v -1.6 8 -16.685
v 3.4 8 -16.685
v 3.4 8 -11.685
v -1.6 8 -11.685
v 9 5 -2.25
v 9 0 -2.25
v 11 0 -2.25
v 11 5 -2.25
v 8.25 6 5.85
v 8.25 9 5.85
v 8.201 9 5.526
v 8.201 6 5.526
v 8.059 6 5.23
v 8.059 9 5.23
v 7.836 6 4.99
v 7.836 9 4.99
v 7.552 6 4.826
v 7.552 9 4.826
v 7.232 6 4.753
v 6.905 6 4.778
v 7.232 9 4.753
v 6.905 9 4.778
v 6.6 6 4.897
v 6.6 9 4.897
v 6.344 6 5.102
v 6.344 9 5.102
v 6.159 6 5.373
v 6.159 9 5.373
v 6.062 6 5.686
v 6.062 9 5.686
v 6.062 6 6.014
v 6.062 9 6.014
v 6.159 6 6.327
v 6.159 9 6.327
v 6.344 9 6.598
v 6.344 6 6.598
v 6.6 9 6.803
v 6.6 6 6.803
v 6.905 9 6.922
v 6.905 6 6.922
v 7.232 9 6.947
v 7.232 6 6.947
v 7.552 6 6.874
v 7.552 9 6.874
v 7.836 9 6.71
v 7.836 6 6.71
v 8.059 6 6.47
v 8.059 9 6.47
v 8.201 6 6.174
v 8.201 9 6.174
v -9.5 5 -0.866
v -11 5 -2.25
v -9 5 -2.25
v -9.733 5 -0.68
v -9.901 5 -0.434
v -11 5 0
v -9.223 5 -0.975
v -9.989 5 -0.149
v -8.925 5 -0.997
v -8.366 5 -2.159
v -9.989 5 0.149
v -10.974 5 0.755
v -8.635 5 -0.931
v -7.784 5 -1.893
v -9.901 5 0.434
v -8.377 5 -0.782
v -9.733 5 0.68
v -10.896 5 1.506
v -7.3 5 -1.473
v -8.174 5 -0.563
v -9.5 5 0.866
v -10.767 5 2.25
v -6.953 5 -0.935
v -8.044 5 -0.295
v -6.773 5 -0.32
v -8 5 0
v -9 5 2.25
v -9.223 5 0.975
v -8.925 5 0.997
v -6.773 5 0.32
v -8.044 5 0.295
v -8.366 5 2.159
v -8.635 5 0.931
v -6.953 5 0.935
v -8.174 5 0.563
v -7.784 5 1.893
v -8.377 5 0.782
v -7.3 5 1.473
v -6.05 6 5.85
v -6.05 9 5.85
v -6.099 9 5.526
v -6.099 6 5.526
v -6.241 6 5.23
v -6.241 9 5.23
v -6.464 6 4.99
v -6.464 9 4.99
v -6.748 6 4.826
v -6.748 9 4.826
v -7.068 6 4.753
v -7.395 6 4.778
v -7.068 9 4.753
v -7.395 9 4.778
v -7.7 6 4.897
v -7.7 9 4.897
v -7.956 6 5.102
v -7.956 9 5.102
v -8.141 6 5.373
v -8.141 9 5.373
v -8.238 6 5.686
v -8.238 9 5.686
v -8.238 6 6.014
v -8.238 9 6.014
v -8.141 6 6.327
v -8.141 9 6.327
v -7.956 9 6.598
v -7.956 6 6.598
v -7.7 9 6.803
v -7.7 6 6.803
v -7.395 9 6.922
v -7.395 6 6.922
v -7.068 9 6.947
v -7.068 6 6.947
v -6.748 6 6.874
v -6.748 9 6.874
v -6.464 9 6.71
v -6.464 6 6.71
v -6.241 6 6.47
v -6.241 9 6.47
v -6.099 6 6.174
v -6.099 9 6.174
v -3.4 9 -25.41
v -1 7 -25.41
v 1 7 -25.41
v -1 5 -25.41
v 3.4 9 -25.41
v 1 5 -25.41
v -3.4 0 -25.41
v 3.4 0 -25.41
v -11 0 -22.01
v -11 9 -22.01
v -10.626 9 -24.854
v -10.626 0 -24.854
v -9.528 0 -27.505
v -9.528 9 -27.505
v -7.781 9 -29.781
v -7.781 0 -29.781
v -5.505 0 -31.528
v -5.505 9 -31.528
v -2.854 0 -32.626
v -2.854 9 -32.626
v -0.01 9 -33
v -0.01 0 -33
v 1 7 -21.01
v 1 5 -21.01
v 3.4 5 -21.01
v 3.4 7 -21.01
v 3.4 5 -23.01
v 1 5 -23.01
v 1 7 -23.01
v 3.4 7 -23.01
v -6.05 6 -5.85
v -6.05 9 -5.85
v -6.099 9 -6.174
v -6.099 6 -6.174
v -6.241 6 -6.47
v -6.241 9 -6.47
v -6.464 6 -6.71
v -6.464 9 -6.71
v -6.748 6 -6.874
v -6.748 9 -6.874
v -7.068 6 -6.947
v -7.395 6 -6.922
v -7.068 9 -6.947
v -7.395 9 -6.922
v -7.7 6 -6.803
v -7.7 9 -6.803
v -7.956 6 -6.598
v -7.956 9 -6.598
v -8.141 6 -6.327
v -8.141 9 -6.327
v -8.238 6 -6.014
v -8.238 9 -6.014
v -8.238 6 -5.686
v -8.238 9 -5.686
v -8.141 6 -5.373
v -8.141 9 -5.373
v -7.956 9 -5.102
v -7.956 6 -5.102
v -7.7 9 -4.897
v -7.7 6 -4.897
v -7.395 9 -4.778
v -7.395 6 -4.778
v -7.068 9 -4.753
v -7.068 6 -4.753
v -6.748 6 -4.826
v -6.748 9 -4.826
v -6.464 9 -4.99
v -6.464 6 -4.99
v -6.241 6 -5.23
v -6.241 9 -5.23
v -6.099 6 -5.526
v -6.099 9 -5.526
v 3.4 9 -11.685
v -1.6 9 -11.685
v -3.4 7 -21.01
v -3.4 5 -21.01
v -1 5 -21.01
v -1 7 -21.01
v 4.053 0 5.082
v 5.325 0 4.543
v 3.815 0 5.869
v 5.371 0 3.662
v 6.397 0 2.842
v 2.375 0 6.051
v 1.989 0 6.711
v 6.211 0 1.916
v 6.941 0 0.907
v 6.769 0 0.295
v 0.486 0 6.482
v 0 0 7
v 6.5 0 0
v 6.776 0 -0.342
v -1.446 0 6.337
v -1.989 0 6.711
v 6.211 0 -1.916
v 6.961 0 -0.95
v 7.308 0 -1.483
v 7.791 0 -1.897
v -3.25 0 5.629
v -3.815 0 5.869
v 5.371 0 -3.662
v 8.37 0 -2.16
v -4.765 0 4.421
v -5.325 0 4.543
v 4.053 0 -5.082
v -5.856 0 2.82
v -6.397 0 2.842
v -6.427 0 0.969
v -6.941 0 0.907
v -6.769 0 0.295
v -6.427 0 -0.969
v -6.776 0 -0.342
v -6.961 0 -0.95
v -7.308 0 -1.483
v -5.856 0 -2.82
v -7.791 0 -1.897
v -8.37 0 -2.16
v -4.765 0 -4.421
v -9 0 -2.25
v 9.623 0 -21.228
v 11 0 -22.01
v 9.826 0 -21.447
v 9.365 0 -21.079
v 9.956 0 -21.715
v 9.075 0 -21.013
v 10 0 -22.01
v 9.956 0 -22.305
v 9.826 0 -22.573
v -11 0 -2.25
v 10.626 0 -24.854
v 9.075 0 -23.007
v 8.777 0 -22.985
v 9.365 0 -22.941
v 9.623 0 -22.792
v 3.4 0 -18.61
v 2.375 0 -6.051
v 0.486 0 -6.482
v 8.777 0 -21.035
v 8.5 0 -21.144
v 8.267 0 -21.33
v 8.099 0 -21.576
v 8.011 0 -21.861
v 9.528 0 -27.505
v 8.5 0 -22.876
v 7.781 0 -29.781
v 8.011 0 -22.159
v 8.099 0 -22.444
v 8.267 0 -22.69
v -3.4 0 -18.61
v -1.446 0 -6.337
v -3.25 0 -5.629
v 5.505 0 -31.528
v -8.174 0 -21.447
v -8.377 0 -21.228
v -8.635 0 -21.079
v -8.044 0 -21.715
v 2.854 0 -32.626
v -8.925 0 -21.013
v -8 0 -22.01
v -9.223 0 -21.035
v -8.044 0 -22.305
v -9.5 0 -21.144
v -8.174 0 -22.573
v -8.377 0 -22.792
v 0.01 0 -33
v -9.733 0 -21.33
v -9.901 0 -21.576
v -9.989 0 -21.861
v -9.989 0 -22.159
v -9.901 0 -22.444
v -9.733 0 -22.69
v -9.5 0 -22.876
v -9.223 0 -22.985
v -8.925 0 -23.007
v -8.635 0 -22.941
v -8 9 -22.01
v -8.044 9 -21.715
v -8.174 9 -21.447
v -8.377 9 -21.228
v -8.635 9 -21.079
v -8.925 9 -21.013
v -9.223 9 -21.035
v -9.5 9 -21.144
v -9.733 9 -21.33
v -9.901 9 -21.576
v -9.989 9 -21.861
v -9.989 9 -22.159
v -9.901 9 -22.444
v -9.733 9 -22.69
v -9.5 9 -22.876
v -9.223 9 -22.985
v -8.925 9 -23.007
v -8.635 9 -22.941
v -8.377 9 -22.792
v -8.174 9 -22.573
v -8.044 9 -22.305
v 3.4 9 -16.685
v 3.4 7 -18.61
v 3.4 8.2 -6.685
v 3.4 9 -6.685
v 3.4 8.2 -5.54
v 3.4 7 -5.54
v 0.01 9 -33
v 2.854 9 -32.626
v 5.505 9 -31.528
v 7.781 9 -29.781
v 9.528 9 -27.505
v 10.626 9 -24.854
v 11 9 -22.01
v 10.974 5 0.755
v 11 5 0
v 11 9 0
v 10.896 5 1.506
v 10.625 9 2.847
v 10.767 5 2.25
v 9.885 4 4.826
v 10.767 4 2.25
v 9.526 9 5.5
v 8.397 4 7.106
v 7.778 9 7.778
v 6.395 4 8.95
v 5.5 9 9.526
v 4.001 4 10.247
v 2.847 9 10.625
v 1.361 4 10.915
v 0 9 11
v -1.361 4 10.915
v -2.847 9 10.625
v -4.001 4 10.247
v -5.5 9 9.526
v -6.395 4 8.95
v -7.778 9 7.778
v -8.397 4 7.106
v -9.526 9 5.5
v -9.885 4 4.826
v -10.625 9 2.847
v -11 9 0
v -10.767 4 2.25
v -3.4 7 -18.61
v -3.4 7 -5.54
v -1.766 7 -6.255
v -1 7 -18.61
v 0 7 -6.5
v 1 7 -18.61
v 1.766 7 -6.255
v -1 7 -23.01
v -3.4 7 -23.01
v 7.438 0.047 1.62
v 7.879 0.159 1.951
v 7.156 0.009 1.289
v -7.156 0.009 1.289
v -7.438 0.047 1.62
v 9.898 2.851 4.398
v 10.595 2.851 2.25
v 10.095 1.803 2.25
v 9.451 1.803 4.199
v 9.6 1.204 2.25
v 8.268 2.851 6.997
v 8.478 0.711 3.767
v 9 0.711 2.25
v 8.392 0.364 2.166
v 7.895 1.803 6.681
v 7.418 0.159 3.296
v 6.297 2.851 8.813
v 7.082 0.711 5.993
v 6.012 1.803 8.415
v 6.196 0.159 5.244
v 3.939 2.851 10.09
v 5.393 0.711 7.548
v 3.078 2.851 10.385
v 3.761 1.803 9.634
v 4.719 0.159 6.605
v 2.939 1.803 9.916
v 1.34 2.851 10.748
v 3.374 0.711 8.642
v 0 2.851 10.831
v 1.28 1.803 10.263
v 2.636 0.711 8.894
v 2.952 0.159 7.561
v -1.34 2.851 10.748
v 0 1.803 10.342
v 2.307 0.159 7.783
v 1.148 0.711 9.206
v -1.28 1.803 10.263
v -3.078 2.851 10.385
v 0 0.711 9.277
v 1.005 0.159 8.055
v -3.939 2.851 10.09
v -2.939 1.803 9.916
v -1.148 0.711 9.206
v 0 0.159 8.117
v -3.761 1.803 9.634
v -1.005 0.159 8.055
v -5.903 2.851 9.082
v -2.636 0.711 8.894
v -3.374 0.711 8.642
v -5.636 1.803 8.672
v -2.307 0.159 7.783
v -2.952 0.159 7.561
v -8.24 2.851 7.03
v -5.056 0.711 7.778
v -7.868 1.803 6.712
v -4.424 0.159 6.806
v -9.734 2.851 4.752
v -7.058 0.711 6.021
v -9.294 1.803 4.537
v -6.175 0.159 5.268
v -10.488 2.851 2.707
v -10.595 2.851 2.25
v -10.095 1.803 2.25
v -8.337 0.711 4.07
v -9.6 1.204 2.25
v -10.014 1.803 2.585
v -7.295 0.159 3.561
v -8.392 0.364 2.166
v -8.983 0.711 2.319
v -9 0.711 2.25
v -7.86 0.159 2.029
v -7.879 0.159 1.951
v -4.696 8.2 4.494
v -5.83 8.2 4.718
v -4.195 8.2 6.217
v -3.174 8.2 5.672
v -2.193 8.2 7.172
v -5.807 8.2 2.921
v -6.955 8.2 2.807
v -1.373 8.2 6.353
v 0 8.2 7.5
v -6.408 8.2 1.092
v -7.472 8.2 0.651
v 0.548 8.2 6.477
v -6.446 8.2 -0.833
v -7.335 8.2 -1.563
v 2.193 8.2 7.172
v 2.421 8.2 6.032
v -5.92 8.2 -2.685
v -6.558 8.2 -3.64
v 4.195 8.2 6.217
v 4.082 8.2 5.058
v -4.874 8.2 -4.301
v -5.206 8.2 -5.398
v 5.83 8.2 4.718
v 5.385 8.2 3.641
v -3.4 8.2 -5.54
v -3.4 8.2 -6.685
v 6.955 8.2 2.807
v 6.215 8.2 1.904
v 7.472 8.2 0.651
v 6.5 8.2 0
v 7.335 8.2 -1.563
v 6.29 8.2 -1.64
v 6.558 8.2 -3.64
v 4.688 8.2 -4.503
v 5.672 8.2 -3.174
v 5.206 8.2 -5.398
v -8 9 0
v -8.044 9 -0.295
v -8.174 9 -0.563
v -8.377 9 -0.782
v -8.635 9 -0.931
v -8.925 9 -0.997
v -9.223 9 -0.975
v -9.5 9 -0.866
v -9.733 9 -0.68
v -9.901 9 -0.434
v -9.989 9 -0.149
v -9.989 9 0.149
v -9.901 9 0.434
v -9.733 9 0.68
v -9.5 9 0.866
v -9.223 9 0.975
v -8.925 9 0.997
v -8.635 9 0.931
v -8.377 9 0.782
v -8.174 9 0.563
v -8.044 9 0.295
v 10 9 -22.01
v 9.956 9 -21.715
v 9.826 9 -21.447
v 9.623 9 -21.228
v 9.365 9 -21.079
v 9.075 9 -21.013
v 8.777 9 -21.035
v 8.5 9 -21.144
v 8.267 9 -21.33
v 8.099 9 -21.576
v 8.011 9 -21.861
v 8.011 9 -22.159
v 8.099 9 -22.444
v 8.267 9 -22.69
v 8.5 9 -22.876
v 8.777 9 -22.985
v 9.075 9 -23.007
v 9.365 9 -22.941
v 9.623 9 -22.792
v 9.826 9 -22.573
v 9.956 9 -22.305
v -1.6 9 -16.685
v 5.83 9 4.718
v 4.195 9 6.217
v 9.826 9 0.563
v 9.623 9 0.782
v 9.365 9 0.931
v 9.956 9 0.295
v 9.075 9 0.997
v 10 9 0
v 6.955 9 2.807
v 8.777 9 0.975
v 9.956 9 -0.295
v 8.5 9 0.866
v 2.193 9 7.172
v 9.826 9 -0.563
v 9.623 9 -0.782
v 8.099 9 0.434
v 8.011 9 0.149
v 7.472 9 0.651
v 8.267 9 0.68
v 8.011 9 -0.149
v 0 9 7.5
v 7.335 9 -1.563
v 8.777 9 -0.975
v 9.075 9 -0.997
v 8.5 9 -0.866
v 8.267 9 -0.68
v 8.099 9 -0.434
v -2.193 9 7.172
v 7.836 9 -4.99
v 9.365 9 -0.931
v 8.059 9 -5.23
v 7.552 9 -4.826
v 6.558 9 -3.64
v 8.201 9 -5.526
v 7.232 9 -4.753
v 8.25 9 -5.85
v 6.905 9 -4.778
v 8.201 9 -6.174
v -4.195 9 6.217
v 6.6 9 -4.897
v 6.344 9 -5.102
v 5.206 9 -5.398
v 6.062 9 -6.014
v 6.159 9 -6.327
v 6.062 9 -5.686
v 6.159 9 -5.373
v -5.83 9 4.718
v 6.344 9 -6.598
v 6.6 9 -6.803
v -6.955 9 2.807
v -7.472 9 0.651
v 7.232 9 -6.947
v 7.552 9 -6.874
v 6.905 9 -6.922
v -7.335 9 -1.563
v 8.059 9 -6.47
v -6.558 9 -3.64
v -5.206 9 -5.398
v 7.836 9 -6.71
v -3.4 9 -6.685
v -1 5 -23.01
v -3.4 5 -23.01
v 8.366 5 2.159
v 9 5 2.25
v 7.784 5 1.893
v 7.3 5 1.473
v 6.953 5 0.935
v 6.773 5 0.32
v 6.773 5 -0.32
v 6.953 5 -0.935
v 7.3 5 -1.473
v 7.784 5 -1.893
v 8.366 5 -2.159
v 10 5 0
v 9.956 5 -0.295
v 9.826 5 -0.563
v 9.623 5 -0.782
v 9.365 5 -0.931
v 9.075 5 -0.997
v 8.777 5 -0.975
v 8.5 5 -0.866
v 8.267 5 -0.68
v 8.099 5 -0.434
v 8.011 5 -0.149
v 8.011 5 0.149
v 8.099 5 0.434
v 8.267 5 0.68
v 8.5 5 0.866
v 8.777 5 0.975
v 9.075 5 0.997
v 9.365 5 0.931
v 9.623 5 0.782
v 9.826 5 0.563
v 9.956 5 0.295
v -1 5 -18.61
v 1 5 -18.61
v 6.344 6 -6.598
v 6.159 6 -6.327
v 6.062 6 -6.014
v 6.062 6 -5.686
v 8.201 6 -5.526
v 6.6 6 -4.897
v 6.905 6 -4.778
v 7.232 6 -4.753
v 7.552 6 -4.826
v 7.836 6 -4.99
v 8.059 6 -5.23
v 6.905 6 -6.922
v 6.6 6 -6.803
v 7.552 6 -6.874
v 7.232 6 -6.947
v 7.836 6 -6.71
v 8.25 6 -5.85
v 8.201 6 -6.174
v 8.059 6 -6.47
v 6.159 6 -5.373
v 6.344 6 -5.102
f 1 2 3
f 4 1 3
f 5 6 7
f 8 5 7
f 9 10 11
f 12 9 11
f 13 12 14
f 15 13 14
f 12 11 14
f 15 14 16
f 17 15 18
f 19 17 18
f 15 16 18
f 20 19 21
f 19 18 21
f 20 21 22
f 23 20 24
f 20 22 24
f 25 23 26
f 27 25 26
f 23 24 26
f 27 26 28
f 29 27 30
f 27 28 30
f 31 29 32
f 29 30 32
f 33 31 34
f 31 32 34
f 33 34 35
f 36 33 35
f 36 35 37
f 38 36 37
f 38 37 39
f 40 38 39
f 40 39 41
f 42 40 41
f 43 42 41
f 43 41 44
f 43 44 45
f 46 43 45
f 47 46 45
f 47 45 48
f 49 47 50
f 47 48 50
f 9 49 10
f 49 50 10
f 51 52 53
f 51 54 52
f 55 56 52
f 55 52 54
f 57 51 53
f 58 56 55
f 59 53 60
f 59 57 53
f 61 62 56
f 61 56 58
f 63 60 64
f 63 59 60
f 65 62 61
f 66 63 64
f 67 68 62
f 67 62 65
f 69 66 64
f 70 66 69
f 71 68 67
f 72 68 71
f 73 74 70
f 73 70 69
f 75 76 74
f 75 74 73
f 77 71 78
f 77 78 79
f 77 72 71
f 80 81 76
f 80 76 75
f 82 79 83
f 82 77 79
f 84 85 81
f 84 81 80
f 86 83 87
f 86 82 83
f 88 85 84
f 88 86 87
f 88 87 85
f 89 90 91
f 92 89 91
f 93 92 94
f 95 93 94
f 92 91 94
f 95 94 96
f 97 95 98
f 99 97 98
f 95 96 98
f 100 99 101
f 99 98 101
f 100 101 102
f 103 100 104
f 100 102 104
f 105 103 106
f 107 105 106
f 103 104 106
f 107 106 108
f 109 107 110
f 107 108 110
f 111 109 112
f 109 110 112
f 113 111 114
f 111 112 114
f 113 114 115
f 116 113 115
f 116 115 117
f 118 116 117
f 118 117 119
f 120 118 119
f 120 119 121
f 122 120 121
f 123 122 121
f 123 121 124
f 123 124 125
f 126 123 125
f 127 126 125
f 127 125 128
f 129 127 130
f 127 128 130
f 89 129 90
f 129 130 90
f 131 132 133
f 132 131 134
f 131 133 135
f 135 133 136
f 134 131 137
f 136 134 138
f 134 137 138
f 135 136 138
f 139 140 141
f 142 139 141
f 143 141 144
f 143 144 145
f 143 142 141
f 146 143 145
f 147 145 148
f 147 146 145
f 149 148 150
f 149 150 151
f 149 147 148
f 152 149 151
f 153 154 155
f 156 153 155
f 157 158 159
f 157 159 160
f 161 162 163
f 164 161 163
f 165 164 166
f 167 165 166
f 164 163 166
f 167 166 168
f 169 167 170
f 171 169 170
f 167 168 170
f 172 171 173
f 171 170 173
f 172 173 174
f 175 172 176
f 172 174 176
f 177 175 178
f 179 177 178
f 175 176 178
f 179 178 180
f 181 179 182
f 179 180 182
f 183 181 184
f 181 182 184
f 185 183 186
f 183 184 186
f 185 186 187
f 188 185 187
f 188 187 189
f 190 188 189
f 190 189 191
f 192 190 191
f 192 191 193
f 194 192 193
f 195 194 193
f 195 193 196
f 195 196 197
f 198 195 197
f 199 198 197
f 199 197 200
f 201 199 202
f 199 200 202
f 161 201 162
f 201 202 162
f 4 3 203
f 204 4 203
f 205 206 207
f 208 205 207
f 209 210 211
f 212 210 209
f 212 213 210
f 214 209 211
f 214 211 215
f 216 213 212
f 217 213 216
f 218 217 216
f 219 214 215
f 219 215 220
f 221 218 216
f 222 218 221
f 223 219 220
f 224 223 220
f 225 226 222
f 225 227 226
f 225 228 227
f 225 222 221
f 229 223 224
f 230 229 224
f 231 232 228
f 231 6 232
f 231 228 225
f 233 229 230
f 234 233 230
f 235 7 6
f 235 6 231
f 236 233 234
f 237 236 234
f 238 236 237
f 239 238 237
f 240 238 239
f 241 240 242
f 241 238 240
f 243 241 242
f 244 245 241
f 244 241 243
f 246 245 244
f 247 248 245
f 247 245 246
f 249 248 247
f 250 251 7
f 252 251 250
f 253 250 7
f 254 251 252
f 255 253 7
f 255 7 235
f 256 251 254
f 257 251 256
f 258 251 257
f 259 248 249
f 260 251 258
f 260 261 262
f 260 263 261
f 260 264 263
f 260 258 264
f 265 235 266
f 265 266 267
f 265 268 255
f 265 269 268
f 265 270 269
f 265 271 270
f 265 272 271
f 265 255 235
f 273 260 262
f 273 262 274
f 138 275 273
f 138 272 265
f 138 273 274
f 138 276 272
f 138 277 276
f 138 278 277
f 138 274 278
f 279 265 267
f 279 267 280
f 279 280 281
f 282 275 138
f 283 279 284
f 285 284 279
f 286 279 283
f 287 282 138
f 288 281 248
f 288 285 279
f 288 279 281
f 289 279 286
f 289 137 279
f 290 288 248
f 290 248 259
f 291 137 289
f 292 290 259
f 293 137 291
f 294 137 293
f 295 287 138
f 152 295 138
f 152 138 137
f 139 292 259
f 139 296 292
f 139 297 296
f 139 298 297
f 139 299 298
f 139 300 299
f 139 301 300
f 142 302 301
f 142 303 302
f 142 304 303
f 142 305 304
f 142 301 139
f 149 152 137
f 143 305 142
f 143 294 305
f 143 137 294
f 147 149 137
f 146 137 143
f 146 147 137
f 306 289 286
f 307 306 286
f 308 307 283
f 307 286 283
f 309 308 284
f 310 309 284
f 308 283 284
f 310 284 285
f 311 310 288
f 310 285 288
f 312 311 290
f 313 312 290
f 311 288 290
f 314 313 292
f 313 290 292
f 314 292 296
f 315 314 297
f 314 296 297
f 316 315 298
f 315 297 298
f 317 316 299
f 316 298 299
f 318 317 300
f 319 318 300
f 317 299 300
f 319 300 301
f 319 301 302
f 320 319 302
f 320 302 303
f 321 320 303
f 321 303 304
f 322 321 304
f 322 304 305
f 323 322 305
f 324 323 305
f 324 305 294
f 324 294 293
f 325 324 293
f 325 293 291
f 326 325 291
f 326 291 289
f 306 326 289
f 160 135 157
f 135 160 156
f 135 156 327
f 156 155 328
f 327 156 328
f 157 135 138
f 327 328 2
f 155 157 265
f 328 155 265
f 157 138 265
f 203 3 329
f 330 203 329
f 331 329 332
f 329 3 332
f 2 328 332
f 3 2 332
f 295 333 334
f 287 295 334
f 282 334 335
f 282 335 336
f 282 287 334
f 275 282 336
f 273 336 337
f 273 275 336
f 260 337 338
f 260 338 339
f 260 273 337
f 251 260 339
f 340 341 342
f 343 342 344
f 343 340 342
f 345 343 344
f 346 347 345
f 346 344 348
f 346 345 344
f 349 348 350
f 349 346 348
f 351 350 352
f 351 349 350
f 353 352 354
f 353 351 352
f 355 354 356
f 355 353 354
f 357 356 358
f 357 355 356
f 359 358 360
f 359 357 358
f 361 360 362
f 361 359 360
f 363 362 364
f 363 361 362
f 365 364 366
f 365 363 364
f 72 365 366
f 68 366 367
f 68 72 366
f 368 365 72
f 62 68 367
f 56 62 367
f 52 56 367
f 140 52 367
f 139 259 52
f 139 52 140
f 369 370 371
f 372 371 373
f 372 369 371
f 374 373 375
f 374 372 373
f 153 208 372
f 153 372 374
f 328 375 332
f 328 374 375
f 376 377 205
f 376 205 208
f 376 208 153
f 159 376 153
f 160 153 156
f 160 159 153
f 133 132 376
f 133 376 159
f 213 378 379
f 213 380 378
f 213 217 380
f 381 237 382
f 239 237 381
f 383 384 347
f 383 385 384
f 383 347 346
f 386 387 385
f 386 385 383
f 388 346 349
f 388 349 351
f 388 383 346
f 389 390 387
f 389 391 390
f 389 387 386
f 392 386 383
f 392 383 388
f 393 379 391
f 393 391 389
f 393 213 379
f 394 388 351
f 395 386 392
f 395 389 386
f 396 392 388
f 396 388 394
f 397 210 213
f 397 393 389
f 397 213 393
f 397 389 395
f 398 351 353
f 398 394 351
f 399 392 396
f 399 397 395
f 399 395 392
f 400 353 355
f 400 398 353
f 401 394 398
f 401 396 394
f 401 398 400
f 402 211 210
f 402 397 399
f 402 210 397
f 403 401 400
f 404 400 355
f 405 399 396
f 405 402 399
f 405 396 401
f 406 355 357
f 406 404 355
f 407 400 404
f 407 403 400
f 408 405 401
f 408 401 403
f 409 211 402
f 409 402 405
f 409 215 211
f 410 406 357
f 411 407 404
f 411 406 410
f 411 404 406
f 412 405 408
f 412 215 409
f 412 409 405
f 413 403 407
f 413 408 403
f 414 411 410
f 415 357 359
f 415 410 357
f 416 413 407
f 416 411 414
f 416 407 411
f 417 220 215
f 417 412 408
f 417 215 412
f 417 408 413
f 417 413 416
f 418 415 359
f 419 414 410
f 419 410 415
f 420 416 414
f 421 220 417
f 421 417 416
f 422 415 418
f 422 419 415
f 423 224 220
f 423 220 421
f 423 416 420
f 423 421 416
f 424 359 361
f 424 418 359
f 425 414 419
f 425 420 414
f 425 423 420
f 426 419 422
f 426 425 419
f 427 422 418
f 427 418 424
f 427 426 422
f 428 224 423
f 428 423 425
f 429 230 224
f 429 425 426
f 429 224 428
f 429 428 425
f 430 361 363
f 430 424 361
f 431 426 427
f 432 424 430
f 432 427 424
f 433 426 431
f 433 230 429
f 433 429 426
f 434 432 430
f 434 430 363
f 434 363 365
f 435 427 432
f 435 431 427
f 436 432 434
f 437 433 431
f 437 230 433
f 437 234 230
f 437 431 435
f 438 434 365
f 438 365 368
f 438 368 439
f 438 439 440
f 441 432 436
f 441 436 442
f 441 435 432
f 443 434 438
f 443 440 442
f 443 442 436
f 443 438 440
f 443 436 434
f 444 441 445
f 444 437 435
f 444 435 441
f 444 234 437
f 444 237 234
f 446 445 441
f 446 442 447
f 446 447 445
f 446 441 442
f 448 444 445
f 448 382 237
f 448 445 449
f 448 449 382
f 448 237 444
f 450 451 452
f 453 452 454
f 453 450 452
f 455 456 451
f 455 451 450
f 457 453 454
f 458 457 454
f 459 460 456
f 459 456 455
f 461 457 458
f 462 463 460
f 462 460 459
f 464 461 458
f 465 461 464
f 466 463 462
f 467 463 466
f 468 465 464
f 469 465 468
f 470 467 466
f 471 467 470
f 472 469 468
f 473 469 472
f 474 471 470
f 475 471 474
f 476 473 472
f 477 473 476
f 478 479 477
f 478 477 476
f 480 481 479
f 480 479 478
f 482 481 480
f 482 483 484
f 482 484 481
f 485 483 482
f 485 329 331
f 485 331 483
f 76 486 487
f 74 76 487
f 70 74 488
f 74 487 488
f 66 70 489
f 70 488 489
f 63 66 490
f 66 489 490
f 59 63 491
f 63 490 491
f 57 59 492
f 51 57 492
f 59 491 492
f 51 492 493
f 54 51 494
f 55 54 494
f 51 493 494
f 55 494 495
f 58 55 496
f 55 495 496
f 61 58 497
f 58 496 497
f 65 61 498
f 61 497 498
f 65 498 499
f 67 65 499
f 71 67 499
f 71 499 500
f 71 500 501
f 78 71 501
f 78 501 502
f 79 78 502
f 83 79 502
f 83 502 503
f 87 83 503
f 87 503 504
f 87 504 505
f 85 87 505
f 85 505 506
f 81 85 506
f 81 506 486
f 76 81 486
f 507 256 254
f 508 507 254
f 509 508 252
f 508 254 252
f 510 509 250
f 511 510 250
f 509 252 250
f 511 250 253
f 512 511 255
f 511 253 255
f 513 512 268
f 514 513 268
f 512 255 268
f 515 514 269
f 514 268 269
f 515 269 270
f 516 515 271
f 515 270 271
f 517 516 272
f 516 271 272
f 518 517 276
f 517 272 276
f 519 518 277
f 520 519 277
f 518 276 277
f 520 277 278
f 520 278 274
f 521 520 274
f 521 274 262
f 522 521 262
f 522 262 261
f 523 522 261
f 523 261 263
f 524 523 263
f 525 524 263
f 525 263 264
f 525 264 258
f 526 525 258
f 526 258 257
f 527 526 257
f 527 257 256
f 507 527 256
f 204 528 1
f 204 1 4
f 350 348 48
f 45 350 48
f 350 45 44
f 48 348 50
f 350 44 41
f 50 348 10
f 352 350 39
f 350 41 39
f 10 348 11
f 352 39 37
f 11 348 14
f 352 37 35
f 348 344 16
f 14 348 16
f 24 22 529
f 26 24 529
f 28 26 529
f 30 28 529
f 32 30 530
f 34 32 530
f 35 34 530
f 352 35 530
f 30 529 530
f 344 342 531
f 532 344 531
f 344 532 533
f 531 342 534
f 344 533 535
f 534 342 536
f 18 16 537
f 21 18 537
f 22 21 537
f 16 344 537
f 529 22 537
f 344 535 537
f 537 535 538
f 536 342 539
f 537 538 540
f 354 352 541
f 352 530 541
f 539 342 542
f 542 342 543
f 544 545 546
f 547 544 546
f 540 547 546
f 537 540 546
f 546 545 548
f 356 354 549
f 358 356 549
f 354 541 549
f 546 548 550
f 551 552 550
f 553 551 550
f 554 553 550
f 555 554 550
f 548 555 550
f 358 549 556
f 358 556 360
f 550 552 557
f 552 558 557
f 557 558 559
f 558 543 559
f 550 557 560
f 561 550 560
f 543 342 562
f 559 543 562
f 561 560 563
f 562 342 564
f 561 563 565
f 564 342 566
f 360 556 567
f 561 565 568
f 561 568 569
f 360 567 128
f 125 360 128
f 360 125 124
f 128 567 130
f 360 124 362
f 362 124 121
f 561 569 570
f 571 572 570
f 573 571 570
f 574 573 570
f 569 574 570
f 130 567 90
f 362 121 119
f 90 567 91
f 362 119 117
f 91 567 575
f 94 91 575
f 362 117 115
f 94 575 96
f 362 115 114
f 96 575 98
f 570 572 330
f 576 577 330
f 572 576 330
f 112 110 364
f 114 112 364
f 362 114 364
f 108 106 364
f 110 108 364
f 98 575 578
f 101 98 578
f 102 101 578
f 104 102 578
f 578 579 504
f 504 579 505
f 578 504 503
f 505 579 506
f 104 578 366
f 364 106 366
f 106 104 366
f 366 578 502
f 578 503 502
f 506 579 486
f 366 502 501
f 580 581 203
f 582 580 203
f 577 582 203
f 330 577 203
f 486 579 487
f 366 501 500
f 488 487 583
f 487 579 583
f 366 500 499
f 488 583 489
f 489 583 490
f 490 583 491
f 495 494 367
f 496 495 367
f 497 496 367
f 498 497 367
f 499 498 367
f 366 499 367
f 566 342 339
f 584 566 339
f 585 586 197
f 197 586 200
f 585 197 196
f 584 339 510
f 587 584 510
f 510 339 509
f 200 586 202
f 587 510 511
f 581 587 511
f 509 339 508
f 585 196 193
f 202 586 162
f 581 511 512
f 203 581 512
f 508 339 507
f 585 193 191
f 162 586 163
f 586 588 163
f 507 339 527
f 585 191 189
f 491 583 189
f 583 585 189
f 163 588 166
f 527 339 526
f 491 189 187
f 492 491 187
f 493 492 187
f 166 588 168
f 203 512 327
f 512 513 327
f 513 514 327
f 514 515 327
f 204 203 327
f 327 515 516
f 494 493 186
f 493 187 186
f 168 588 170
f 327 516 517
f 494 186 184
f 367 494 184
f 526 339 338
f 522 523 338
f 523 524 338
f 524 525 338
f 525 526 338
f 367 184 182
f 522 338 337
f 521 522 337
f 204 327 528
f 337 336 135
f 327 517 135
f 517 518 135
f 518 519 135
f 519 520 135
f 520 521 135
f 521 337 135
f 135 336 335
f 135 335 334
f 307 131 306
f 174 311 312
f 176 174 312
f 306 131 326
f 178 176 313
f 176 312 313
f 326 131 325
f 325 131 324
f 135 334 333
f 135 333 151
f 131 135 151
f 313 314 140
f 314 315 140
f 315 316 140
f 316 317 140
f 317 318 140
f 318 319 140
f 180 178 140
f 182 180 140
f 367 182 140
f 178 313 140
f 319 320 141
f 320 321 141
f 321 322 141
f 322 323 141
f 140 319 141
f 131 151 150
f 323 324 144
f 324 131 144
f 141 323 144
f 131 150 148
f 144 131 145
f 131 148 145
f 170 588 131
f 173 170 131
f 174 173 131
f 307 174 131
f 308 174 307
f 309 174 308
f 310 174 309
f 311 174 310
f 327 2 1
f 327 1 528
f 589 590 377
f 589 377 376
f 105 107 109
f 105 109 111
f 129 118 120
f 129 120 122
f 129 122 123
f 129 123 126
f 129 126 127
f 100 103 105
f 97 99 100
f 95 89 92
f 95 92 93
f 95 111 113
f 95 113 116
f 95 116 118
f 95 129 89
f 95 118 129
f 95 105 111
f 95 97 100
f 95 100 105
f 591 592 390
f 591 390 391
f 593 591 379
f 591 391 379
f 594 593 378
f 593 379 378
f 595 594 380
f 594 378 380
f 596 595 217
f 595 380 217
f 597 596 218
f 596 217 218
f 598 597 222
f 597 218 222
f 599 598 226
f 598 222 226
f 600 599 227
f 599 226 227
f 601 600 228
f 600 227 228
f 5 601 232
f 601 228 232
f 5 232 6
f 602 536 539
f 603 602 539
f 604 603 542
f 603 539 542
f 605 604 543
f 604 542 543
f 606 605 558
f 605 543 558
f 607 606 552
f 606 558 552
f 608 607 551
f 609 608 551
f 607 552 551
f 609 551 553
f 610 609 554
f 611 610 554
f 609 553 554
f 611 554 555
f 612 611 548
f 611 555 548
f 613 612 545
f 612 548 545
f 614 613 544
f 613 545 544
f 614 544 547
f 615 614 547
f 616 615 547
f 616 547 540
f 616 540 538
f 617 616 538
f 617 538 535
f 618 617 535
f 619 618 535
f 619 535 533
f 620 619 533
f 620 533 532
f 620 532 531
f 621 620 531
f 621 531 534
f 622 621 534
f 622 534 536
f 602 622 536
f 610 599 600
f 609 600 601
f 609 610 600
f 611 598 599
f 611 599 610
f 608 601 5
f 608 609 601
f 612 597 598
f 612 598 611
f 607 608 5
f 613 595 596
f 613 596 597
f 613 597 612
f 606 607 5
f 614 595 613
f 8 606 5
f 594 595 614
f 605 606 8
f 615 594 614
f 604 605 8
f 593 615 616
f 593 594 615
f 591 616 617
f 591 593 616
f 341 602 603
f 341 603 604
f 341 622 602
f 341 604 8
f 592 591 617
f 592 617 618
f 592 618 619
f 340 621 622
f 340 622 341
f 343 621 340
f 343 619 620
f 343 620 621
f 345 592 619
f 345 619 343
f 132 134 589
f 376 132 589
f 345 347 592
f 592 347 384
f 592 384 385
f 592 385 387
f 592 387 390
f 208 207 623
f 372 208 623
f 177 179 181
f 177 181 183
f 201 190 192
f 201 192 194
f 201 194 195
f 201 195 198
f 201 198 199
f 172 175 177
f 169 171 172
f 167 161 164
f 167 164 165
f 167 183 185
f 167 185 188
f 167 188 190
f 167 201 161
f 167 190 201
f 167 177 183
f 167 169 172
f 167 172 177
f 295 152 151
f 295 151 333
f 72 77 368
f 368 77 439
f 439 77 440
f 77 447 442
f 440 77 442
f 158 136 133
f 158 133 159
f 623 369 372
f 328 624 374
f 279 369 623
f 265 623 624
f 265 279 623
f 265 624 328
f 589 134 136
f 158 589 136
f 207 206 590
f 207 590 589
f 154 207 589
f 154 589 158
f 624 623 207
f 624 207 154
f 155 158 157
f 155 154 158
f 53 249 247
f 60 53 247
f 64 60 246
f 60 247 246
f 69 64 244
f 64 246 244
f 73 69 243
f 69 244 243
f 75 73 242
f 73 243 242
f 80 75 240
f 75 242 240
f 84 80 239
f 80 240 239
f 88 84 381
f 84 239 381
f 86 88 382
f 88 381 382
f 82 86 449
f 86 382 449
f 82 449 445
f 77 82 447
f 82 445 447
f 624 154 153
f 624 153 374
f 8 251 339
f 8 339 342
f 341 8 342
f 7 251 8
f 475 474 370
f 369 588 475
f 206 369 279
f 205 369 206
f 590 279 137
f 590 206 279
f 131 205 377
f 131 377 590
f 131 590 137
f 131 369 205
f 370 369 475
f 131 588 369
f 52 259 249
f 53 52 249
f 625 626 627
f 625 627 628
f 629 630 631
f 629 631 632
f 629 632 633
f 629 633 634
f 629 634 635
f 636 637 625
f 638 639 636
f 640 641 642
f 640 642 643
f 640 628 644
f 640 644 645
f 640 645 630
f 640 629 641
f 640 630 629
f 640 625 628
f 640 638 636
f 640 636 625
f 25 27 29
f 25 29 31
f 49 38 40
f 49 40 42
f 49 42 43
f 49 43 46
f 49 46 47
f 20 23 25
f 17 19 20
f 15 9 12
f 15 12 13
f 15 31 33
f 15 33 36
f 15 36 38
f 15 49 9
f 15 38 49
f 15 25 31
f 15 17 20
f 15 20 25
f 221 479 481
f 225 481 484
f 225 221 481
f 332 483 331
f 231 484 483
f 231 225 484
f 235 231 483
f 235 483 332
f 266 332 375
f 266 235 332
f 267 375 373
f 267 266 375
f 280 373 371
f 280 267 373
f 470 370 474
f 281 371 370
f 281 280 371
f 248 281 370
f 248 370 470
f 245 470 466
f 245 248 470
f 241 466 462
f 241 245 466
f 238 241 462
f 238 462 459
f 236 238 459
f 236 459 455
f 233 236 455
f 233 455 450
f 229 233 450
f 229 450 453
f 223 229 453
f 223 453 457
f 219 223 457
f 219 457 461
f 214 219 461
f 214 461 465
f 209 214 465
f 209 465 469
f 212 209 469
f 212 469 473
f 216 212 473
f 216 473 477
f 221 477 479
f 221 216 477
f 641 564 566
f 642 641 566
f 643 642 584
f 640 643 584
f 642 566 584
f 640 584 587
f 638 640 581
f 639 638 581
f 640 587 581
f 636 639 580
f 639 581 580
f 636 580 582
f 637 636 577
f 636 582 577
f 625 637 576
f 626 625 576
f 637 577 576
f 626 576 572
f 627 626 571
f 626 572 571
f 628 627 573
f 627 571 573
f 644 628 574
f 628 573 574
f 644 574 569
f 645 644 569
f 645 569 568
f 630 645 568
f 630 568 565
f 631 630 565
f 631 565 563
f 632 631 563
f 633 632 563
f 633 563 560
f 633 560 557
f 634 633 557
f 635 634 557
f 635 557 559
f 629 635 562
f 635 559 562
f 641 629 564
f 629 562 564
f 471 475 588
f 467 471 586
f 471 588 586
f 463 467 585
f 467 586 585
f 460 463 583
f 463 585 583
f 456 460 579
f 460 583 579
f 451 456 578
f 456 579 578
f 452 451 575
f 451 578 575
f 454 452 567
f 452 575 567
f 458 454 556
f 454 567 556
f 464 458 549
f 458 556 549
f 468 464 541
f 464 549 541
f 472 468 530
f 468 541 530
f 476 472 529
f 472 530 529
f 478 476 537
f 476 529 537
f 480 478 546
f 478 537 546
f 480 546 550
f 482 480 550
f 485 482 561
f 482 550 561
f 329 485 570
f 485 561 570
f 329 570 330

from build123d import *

# Parameters (mm, degrees)
SKETCH1_R           = 6.5
BOSS_EXTRUDE1_DEPTH = 9
SKETCH2_R           = 1.1
CUT_EXTRUDE1_DEPTH  = 3
SKETCH3_R           = 1
CUT_EXTRUDE2_DEPTH  = 20
CUT_EXTRUDE3_DEPTH  = 5
SKETCH6_W           = 6.8
SKETCH6_H           = 6.8
CUT_EXTRUDE4_DEPTH  = 5
SKETCH7_W           = 2.4
SKETCH7_H           = 2.4
CUT_EXTRUDE5_DEPTH  = 5
FILLET2_R           = 4
SKETCH8_R           = 1
CUT_EXTRUDE6_DEPTH  = 20
SKETCH9_R           = 7.5
CUT_EXTRUDE7_DEPTH  = 0.8
SKETCH10_W          = 6.8
SKETCH10_H          = 19.870144406
CUT_EXTRUDE8_DEPTH  = 2
SKETCH11_W          = 5
SKETCH11_H          = 1
BOSS_EXTRUDE2_DEPTH = 5


with BuildPart() as part:
    # Sketch1 → Boss-Extrude1 (new body)
    with BuildSketch(Plane(origin=(0, 0, 0), x_dir=(1, 0, 0), z_dir=(0, 1, 0))):
        with BuildLine():
            Line((-11, 0), (-11, 22.01))
            ThreePointArc((-11, 22.01), (-7.781103525, 29.781103525), (-0.01, 33))
            Line((-0.01, 33), (0.01, 33))
            ThreePointArc((0.01, 33), (7.781103525, 29.781103525), (11, 22.01))
            Line((11, 22.01), (11, 0))
            ThreePointArc((11, 0), (0, -11), (-11, 0))
        make_face()
        Circle(SKETCH1_R, mode=Mode.SUBTRACT)
    extrude(amount=BOSS_EXTRUDE1_DEPTH)

    # Sketch2 → Cut-Extrude1 (cut)
    with BuildSketch(Plane(origin=(0, 9, 0), x_dir=(1, 0, 0), z_dir=(0, 1, 0))):
        with Locations((-7.15, 5.85)):
            Circle(SKETCH2_R)
        with Locations((-7.15, -5.85)):
            Circle(SKETCH2_R)
        with Locations((7.15, -5.85)):
            Circle(SKETCH2_R)
        with Locations((7.15, 5.85)):
            Circle(SKETCH2_R)
    extrude(amount=-CUT_EXTRUDE1_DEPTH, mode=Mode.SUBTRACT)

    # Sketch3 → Cut-Extrude2 (cut)
    with BuildSketch(Plane(origin=(0, 9, 0), x_dir=(1, 0, 0), z_dir=(0, 1, 0))):
        with Locations((-9, 0)):
            Circle(SKETCH3_R)
        with Locations((9, 0)):
            Circle(SKETCH3_R)
    extrude(amount=-CUT_EXTRUDE2_DEPTH, mode=Mode.SUBTRACT)

    # Sketch4 → Cut-Extrude3 (cut)
    with BuildSketch(Plane.XZ):
        with BuildLine():
            Line((-9, 2.25), (-10.767427734, 2.25))
            Line((-10.767427734, 2.25), (-12, 0))
            Line((-12, 0), (-11, -2.25))
            Line((-11, -2.25), (-9, -2.25))
            ThreePointArc((-9, -2.25), (-6.75, 0), (-9, 2.25))
        make_face()
        with BuildLine():
            Line((12, 0), (10.767427734, 2.25))
            Line((10.767427734, 2.25), (9, 2.25))
            ThreePointArc((9, 2.25), (6.75, 0), (9, -2.25))
            Line((9, -2.25), (11, -2.25))
            Line((11, -2.25), (12, 0))
        make_face()
    extrude(amount=-CUT_EXTRUDE3_DEPTH, mode=Mode.SUBTRACT)

    # Sketch6 → Cut-Extrude4 (cut)
    with BuildSketch(Plane.XZ):
        with Locations((0, -22.01)):
            Rectangle(SKETCH6_W, SKETCH6_H)
    extrude(amount=-CUT_EXTRUDE4_DEPTH, mode=Mode.SUBTRACT)

    # Sketch7 → Cut-Extrude5 (cut)
    with BuildSketch(Plane.XZ.offset(-5)):
        with Locations((2.2, -19.81)):
            Rectangle(SKETCH7_W, SKETCH7_H)
        with Locations((-2.2, -19.81)):
            Rectangle(SKETCH7_W, SKETCH7_H)
        with Locations((2.2, -24.21)):
            Rectangle(SKETCH7_W, SKETCH7_H)
        with Locations((-2.2, -24.21)):
            Rectangle(SKETCH7_W, SKETCH7_H)
    extrude(amount=-CUT_EXTRUDE5_DEPTH, mode=Mode.SUBTRACT)

    # Fillet2
    fillet2_edges = [part.edges().sort_by_distance(p)[0] for p in [
        (0, 0, 11),
    ]]
    fillet(fillet2_edges, radius=FILLET2_R)

    # Sketch8 → Cut-Extrude6 (cut)
    with BuildSketch(Plane.XZ):
        with Locations((-9, -22.01)):
            Circle(SKETCH8_R)
        with Locations((9, -22.01)):
            Circle(SKETCH8_R)
    extrude(amount=-CUT_EXTRUDE6_DEPTH, mode=Mode.SUBTRACT)

    # Sketch9 → Cut-Extrude7 (cut)
    with BuildSketch(Plane(origin=(0, 9, 0), x_dir=(1, 0, 0), z_dir=(0, 1, 0))):
        Circle(SKETCH9_R)
    extrude(amount=-CUT_EXTRUDE7_DEPTH, mode=Mode.SUBTRACT)

    # Sketch10 → Cut-Extrude8 (cut)
    with BuildSketch(Plane(origin=(0, 9, 0), x_dir=(1, 0, 0), z_dir=(0, 1, 0))):
        with Locations((0, 15.474927797)):
            Rectangle(SKETCH10_W, SKETCH10_H)
    extrude(amount=-CUT_EXTRUDE8_DEPTH, mode=Mode.SUBTRACT)

    # Sketch11 → Boss-Extrude2 (add)
    with BuildSketch(Plane.ZY.offset(-3.4)):
        with Locations((-14.185057965, 8.5)):
            Rectangle(SKETCH11_W, SKETCH11_H)
    extrude(amount=BOSS_EXTRUDE2_DEPTH)


solid = part.part
